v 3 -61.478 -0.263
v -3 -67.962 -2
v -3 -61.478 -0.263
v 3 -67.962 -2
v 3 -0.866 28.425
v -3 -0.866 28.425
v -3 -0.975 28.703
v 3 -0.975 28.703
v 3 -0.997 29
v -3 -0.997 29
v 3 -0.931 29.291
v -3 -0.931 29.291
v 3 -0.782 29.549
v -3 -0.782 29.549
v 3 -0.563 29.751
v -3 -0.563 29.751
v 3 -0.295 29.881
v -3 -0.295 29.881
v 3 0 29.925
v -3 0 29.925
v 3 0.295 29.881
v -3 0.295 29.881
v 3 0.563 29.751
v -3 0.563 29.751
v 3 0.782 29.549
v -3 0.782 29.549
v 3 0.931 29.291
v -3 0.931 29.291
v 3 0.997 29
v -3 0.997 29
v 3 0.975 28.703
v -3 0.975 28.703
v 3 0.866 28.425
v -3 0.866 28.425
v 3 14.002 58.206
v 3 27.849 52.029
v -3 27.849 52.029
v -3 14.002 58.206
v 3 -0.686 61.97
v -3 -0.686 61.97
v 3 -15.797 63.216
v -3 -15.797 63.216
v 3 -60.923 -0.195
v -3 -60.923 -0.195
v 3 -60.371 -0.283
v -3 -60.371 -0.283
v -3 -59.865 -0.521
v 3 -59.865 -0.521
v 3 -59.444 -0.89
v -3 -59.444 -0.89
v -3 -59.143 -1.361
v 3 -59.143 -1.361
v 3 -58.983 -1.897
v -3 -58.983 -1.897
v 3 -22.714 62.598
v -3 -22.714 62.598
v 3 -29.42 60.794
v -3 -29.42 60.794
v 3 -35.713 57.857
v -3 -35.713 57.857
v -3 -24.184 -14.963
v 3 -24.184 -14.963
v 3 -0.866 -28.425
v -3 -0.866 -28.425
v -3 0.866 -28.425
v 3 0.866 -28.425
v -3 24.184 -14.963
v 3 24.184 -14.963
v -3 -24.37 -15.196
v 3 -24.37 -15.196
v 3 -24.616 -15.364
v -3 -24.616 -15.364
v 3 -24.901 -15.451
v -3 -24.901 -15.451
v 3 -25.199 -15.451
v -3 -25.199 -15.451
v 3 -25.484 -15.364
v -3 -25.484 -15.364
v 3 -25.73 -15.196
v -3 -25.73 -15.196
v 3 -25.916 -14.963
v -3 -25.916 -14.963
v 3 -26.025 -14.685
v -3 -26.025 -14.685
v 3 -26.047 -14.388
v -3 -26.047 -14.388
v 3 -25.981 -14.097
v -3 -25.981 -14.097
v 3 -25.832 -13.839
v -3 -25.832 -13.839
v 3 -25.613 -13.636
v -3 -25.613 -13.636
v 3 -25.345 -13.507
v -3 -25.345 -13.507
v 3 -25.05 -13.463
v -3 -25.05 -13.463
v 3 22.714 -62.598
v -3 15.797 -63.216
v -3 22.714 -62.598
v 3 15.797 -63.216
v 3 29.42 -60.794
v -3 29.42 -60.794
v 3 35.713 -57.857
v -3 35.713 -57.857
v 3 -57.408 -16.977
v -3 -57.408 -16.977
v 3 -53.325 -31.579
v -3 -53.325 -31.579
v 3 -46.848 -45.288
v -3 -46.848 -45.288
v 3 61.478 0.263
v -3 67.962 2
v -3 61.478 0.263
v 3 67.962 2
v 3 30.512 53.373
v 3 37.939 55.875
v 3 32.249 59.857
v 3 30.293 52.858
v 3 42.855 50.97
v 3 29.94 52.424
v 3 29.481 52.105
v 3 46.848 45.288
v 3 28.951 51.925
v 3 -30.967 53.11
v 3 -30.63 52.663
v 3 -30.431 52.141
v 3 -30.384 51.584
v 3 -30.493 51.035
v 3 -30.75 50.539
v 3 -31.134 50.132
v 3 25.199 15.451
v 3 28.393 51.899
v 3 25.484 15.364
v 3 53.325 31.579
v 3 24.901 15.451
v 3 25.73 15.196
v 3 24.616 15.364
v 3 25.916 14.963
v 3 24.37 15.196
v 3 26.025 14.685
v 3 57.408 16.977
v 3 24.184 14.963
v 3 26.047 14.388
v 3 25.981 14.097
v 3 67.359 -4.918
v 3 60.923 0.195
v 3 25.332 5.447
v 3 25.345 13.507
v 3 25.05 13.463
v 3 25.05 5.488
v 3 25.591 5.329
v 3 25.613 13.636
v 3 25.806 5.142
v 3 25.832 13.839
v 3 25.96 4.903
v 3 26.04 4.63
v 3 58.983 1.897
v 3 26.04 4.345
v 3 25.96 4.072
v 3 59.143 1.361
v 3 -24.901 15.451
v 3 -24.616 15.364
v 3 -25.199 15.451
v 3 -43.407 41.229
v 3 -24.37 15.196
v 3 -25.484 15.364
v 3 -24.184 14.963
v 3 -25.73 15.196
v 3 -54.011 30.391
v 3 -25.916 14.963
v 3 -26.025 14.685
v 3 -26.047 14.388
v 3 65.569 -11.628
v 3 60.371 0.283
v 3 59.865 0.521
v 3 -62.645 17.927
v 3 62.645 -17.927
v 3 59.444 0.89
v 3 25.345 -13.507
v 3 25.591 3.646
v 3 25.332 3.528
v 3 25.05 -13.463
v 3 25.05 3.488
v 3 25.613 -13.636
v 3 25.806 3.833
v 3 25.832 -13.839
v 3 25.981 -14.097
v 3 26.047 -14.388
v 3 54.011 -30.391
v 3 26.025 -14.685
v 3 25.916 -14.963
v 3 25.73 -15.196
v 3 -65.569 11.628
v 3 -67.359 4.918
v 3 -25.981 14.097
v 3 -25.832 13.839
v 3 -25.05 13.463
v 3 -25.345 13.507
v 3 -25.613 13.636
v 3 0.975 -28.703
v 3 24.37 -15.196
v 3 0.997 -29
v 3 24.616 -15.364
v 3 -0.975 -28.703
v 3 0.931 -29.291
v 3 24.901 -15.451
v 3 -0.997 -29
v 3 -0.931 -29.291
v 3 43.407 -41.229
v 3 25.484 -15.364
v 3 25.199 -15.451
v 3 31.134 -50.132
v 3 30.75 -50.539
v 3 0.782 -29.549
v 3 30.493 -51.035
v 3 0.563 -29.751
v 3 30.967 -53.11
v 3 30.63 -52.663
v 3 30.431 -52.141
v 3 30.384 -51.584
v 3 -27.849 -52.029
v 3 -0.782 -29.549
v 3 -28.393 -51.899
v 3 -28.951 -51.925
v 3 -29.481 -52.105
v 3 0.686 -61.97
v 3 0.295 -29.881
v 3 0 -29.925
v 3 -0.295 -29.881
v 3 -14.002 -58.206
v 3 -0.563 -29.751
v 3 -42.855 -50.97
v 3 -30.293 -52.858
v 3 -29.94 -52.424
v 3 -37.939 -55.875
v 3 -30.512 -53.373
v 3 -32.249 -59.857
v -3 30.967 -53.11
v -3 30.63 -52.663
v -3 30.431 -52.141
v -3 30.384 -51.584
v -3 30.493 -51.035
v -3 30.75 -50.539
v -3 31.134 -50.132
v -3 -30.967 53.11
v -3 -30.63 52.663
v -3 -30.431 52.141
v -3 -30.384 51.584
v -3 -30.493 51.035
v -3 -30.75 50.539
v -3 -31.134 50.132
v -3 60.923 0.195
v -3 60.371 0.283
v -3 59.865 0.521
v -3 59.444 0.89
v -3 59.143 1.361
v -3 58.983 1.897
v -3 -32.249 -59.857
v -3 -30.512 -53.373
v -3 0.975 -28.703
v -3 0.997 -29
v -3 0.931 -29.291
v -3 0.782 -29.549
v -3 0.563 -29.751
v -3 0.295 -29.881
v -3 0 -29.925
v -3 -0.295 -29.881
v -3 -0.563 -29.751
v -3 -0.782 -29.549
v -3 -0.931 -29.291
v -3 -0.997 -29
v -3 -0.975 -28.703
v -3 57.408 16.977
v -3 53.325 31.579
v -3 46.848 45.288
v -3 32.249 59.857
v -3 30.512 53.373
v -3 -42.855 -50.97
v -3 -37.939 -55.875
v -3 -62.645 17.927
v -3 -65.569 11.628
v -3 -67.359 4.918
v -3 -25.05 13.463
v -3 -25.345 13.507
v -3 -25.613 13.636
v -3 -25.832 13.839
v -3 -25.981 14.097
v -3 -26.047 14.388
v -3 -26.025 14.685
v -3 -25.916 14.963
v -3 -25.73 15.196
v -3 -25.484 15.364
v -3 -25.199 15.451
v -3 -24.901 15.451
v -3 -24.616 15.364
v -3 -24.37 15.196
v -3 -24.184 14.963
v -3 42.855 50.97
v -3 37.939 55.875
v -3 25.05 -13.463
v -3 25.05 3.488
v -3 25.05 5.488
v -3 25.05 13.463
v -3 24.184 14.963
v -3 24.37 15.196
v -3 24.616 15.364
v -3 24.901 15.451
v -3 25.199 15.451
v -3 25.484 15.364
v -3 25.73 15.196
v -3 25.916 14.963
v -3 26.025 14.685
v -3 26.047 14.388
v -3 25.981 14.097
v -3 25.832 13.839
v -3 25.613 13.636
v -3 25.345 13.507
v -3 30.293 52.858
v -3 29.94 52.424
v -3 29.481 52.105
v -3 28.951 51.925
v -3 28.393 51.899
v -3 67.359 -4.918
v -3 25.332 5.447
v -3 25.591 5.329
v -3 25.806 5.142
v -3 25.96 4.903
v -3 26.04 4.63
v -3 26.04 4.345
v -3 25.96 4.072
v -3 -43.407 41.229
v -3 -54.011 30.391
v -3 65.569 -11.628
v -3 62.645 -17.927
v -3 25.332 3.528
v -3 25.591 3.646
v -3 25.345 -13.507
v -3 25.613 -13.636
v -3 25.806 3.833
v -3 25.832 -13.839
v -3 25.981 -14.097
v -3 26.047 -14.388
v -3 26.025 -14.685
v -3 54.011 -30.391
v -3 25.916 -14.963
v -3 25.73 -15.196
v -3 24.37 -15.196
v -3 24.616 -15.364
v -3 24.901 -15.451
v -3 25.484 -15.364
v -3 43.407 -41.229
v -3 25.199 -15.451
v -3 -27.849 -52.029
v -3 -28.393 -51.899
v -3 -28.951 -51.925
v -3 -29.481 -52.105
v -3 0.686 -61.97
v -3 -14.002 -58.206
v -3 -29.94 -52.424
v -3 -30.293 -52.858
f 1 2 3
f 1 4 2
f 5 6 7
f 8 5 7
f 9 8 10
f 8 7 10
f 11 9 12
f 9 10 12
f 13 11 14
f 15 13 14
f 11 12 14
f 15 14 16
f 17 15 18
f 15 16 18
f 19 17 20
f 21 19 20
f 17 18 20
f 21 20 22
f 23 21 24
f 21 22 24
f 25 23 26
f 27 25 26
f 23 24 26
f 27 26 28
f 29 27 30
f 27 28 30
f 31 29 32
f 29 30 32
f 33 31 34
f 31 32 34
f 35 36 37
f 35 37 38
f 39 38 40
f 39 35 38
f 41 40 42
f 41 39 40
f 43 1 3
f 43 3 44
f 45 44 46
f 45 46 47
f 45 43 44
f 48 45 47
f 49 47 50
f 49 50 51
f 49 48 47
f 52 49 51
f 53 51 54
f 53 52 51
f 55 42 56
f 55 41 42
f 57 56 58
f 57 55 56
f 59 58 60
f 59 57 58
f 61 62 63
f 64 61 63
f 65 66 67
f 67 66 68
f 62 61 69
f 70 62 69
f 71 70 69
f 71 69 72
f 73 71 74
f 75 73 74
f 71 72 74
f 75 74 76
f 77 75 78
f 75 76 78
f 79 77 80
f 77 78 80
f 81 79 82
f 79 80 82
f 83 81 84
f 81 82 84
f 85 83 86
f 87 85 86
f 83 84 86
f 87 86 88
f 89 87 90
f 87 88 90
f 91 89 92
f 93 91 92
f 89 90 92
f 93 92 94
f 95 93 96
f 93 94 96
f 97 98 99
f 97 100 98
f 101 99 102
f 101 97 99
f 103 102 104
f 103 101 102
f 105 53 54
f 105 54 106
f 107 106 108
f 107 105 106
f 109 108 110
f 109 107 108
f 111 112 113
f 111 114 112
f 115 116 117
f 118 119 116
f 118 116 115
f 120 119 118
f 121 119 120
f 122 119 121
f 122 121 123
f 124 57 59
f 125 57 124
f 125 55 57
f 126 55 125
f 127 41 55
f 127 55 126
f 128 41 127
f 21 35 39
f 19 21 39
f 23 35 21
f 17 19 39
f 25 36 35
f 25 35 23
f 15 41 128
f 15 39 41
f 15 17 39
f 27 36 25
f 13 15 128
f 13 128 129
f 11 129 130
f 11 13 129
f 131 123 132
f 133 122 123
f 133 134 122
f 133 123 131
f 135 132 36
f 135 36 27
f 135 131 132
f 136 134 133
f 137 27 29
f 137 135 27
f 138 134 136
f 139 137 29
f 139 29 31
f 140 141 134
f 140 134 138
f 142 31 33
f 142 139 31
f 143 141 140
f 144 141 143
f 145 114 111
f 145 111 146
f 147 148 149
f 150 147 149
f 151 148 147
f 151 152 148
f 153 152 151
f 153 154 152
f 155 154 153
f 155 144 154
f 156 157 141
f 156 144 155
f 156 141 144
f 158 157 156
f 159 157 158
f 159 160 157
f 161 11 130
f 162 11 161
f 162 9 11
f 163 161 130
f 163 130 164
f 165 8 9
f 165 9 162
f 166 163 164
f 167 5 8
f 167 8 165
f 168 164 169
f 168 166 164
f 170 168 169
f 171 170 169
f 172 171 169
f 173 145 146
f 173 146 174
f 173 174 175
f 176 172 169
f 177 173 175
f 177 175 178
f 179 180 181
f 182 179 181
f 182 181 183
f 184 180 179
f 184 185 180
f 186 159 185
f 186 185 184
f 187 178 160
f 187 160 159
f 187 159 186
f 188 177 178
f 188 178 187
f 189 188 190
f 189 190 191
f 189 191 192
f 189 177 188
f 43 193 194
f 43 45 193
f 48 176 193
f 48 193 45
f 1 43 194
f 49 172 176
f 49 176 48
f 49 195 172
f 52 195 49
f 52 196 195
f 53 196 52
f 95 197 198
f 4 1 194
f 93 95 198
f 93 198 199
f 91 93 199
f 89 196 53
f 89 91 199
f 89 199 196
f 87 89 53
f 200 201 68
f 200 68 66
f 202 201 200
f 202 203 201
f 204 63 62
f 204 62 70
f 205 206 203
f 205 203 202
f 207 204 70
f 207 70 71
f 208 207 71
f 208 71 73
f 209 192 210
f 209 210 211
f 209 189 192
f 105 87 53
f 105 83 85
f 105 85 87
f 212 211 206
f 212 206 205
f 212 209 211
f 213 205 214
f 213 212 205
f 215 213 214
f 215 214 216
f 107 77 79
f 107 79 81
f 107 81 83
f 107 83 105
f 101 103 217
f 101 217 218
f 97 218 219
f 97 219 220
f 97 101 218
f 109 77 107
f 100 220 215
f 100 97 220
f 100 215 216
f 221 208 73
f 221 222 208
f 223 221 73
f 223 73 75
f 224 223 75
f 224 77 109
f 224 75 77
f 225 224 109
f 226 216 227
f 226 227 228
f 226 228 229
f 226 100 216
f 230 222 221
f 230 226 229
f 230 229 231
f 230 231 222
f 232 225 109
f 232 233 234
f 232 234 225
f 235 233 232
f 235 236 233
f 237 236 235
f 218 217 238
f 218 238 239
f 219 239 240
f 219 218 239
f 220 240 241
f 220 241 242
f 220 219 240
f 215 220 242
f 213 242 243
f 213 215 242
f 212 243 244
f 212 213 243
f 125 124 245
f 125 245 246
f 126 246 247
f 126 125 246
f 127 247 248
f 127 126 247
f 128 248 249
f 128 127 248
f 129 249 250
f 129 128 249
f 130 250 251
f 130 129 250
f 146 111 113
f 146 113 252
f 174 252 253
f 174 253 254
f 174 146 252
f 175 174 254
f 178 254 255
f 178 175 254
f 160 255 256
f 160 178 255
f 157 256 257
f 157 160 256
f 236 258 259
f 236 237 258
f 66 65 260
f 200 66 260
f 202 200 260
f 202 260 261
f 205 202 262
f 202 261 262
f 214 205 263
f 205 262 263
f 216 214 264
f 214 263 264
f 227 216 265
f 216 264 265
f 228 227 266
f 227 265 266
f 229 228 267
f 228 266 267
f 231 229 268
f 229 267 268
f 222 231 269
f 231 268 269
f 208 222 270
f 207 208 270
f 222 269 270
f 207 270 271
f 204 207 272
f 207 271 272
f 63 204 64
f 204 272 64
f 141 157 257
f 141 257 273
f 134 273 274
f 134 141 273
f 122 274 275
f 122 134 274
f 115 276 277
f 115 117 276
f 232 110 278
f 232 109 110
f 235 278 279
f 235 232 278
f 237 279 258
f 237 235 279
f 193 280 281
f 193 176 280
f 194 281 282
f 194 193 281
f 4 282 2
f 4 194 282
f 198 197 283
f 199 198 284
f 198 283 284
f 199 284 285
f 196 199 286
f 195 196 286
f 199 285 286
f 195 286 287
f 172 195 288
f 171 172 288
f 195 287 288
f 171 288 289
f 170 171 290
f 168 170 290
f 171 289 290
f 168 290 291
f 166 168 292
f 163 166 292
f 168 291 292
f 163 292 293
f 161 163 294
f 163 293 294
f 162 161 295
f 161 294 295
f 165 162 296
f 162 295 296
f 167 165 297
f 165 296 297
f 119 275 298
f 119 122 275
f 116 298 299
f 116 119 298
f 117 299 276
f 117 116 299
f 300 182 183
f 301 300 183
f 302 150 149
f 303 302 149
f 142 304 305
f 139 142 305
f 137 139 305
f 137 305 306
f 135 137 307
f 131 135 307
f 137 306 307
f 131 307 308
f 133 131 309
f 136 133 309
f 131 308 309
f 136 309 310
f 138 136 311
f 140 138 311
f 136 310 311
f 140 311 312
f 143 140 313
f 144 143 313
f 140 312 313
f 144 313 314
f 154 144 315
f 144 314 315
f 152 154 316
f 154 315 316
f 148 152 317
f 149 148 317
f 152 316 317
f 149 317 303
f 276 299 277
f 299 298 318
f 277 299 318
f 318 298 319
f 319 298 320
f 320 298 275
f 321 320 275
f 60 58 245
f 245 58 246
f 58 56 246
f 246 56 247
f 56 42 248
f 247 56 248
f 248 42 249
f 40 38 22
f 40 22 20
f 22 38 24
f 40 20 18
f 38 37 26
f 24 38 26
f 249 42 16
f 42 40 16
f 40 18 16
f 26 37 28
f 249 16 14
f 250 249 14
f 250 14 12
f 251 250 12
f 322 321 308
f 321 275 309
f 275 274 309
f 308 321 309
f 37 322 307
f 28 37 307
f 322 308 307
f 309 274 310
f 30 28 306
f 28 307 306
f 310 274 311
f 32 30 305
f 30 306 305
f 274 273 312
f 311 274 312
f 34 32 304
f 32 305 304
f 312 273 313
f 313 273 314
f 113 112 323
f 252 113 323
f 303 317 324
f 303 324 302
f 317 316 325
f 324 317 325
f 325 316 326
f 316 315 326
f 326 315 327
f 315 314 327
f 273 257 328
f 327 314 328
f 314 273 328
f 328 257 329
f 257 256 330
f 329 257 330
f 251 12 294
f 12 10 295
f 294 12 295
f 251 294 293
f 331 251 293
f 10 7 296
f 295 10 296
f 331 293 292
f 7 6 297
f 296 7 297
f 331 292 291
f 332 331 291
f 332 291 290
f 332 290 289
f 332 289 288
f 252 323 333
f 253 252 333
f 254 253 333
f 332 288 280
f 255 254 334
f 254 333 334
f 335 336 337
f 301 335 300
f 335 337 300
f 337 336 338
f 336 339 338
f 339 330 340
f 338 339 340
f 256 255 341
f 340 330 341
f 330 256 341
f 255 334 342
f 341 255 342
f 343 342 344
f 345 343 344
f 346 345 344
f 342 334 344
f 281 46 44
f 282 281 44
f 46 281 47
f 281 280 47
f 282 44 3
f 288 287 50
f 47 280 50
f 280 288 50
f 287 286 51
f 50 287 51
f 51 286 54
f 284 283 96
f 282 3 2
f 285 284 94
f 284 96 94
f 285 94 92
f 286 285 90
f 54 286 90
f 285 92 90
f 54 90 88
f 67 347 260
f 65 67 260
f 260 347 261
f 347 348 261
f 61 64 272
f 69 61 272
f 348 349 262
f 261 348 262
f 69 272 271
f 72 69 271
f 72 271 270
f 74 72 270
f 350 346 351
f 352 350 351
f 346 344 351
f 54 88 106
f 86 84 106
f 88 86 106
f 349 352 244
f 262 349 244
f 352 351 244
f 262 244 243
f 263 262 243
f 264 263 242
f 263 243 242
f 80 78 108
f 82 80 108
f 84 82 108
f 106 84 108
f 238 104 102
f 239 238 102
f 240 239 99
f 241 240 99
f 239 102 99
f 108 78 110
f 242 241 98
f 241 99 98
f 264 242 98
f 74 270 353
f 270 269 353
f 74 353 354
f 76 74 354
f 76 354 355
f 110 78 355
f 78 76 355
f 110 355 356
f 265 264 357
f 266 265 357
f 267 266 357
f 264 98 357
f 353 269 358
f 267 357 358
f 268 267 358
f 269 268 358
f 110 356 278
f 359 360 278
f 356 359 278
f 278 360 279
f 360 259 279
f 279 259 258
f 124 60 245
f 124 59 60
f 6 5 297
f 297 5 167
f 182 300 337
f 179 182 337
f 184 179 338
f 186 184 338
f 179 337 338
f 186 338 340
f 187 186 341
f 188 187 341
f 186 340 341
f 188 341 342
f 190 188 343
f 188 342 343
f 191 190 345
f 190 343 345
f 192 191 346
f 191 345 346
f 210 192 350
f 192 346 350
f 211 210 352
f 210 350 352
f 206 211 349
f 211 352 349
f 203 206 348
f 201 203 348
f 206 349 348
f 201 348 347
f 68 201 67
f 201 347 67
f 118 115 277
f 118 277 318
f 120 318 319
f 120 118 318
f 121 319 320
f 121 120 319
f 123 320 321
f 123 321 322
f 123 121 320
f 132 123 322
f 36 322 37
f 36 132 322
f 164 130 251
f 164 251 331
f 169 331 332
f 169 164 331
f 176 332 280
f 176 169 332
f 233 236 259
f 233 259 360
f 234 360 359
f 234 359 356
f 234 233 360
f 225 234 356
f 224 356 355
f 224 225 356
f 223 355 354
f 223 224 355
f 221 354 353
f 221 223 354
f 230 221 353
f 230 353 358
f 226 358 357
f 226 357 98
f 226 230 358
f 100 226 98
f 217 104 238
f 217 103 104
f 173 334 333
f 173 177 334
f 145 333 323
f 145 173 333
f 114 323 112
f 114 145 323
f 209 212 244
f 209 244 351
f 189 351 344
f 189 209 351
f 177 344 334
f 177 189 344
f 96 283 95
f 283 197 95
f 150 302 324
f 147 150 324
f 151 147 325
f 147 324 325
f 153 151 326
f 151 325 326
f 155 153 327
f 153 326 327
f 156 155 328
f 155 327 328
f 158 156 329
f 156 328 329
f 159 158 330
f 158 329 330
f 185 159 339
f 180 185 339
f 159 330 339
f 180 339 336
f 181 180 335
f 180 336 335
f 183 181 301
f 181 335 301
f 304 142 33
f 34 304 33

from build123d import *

# Parameters (mm, degrees)
SKETCH1_R                = 59
EXTRUDE1_DEPTH           = 3
EXTRUDE2_DEPTH           = 3
CIRPATTERN1_COUNT        = 6
F_2_0_2_DIAMETER_HOLE1_D = 2
F_2_0_2_DIAMETER_HOLE3_D = 2


with BuildPart() as part:
    # Sketch1 → Extrude1 (new, symmetric)
    with BuildSketch(Plane(origin=(0, 0, 0), x_dir=(0, 0, -1), z_dir=(1, 0, 0))):
        Circle(SKETCH1_R)
        Polygon((14.462624243, 25.05), (-14.462624243, 25.05), (-28.925248486, 0), (-14.462624243, -25.05), (14.462624243, -25.05), (28.925248486, 0), align=None, mode=Mode.SUBTRACT)
    extrude(amount=EXTRUDE1_DEPTH, both=True)

    # Sketch2 → Extrude2 (add, symmetric)
    with BuildSketch(Plane(origin=(0, 0, 0), x_dir=(0, 0, -1), z_dir=(1, 0, 0))):
        with BuildLine():
            Line((-2, 67.961805723), (-0.262709442, 61.478149092))
            ThreePointArc((-0.262709442, 61.478149092), (-0.58620663, 59.77173183), (-2.122608272, 58.961805723))
            ThreePointArc((-2.122608272, 58.961805723), (28.679663449, 51.560419941), (51.21368579, 29.294340542))
            ThreePointArc((51.21368579, 29.294340542), (36.791707484, 48.186627241), (17.927108603, 62.644803614))
            ThreePointArc((17.927108603, 62.644803614), (8.312130826, 66.609702921), (-2, 67.961805723))
        make_face()
    extrude2 = extrude(amount=EXTRUDE2_DEPTH, both=True)

    # CirPattern1: Extrude2 ×6 about axis
    cirpattern1_axis = Axis((0, 0, 0), (1, 0, 0))
    for i in range(1, CIRPATTERN1_COUNT):
        add(extrude2.rotate(cirpattern1_axis, i * 360 / CIRPATTERN1_COUNT))

    # Ø2.0 (2) Diameter Hole1 (through all)
    with Locations(Plane(origin=(3, 0, 0), x_dir=(0, 0, -1), z_dir=(1, 0, 0))):
        with Locations((-14.462624243, 25.05), (14.462624243, 25.05), (28.925248486, 0), (14.462624243, -25.05), (-14.462624243, -25.05), (-28.925248486, 0)):
            Hole(F_2_0_2_DIAMETER_HOLE1_D / 2)

    # Ø2.0 (2) Diameter Hole3 (through all)
    with Locations(Plane(origin=(3, 0, 0), x_dir=(0, 0, -1), z_dir=(1, 0, 0))):
        with Locations((-4.487541414, 25.05)):
            Hole(F_2_0_2_DIAMETER_HOLE3_D / 2)


solid = part.part
